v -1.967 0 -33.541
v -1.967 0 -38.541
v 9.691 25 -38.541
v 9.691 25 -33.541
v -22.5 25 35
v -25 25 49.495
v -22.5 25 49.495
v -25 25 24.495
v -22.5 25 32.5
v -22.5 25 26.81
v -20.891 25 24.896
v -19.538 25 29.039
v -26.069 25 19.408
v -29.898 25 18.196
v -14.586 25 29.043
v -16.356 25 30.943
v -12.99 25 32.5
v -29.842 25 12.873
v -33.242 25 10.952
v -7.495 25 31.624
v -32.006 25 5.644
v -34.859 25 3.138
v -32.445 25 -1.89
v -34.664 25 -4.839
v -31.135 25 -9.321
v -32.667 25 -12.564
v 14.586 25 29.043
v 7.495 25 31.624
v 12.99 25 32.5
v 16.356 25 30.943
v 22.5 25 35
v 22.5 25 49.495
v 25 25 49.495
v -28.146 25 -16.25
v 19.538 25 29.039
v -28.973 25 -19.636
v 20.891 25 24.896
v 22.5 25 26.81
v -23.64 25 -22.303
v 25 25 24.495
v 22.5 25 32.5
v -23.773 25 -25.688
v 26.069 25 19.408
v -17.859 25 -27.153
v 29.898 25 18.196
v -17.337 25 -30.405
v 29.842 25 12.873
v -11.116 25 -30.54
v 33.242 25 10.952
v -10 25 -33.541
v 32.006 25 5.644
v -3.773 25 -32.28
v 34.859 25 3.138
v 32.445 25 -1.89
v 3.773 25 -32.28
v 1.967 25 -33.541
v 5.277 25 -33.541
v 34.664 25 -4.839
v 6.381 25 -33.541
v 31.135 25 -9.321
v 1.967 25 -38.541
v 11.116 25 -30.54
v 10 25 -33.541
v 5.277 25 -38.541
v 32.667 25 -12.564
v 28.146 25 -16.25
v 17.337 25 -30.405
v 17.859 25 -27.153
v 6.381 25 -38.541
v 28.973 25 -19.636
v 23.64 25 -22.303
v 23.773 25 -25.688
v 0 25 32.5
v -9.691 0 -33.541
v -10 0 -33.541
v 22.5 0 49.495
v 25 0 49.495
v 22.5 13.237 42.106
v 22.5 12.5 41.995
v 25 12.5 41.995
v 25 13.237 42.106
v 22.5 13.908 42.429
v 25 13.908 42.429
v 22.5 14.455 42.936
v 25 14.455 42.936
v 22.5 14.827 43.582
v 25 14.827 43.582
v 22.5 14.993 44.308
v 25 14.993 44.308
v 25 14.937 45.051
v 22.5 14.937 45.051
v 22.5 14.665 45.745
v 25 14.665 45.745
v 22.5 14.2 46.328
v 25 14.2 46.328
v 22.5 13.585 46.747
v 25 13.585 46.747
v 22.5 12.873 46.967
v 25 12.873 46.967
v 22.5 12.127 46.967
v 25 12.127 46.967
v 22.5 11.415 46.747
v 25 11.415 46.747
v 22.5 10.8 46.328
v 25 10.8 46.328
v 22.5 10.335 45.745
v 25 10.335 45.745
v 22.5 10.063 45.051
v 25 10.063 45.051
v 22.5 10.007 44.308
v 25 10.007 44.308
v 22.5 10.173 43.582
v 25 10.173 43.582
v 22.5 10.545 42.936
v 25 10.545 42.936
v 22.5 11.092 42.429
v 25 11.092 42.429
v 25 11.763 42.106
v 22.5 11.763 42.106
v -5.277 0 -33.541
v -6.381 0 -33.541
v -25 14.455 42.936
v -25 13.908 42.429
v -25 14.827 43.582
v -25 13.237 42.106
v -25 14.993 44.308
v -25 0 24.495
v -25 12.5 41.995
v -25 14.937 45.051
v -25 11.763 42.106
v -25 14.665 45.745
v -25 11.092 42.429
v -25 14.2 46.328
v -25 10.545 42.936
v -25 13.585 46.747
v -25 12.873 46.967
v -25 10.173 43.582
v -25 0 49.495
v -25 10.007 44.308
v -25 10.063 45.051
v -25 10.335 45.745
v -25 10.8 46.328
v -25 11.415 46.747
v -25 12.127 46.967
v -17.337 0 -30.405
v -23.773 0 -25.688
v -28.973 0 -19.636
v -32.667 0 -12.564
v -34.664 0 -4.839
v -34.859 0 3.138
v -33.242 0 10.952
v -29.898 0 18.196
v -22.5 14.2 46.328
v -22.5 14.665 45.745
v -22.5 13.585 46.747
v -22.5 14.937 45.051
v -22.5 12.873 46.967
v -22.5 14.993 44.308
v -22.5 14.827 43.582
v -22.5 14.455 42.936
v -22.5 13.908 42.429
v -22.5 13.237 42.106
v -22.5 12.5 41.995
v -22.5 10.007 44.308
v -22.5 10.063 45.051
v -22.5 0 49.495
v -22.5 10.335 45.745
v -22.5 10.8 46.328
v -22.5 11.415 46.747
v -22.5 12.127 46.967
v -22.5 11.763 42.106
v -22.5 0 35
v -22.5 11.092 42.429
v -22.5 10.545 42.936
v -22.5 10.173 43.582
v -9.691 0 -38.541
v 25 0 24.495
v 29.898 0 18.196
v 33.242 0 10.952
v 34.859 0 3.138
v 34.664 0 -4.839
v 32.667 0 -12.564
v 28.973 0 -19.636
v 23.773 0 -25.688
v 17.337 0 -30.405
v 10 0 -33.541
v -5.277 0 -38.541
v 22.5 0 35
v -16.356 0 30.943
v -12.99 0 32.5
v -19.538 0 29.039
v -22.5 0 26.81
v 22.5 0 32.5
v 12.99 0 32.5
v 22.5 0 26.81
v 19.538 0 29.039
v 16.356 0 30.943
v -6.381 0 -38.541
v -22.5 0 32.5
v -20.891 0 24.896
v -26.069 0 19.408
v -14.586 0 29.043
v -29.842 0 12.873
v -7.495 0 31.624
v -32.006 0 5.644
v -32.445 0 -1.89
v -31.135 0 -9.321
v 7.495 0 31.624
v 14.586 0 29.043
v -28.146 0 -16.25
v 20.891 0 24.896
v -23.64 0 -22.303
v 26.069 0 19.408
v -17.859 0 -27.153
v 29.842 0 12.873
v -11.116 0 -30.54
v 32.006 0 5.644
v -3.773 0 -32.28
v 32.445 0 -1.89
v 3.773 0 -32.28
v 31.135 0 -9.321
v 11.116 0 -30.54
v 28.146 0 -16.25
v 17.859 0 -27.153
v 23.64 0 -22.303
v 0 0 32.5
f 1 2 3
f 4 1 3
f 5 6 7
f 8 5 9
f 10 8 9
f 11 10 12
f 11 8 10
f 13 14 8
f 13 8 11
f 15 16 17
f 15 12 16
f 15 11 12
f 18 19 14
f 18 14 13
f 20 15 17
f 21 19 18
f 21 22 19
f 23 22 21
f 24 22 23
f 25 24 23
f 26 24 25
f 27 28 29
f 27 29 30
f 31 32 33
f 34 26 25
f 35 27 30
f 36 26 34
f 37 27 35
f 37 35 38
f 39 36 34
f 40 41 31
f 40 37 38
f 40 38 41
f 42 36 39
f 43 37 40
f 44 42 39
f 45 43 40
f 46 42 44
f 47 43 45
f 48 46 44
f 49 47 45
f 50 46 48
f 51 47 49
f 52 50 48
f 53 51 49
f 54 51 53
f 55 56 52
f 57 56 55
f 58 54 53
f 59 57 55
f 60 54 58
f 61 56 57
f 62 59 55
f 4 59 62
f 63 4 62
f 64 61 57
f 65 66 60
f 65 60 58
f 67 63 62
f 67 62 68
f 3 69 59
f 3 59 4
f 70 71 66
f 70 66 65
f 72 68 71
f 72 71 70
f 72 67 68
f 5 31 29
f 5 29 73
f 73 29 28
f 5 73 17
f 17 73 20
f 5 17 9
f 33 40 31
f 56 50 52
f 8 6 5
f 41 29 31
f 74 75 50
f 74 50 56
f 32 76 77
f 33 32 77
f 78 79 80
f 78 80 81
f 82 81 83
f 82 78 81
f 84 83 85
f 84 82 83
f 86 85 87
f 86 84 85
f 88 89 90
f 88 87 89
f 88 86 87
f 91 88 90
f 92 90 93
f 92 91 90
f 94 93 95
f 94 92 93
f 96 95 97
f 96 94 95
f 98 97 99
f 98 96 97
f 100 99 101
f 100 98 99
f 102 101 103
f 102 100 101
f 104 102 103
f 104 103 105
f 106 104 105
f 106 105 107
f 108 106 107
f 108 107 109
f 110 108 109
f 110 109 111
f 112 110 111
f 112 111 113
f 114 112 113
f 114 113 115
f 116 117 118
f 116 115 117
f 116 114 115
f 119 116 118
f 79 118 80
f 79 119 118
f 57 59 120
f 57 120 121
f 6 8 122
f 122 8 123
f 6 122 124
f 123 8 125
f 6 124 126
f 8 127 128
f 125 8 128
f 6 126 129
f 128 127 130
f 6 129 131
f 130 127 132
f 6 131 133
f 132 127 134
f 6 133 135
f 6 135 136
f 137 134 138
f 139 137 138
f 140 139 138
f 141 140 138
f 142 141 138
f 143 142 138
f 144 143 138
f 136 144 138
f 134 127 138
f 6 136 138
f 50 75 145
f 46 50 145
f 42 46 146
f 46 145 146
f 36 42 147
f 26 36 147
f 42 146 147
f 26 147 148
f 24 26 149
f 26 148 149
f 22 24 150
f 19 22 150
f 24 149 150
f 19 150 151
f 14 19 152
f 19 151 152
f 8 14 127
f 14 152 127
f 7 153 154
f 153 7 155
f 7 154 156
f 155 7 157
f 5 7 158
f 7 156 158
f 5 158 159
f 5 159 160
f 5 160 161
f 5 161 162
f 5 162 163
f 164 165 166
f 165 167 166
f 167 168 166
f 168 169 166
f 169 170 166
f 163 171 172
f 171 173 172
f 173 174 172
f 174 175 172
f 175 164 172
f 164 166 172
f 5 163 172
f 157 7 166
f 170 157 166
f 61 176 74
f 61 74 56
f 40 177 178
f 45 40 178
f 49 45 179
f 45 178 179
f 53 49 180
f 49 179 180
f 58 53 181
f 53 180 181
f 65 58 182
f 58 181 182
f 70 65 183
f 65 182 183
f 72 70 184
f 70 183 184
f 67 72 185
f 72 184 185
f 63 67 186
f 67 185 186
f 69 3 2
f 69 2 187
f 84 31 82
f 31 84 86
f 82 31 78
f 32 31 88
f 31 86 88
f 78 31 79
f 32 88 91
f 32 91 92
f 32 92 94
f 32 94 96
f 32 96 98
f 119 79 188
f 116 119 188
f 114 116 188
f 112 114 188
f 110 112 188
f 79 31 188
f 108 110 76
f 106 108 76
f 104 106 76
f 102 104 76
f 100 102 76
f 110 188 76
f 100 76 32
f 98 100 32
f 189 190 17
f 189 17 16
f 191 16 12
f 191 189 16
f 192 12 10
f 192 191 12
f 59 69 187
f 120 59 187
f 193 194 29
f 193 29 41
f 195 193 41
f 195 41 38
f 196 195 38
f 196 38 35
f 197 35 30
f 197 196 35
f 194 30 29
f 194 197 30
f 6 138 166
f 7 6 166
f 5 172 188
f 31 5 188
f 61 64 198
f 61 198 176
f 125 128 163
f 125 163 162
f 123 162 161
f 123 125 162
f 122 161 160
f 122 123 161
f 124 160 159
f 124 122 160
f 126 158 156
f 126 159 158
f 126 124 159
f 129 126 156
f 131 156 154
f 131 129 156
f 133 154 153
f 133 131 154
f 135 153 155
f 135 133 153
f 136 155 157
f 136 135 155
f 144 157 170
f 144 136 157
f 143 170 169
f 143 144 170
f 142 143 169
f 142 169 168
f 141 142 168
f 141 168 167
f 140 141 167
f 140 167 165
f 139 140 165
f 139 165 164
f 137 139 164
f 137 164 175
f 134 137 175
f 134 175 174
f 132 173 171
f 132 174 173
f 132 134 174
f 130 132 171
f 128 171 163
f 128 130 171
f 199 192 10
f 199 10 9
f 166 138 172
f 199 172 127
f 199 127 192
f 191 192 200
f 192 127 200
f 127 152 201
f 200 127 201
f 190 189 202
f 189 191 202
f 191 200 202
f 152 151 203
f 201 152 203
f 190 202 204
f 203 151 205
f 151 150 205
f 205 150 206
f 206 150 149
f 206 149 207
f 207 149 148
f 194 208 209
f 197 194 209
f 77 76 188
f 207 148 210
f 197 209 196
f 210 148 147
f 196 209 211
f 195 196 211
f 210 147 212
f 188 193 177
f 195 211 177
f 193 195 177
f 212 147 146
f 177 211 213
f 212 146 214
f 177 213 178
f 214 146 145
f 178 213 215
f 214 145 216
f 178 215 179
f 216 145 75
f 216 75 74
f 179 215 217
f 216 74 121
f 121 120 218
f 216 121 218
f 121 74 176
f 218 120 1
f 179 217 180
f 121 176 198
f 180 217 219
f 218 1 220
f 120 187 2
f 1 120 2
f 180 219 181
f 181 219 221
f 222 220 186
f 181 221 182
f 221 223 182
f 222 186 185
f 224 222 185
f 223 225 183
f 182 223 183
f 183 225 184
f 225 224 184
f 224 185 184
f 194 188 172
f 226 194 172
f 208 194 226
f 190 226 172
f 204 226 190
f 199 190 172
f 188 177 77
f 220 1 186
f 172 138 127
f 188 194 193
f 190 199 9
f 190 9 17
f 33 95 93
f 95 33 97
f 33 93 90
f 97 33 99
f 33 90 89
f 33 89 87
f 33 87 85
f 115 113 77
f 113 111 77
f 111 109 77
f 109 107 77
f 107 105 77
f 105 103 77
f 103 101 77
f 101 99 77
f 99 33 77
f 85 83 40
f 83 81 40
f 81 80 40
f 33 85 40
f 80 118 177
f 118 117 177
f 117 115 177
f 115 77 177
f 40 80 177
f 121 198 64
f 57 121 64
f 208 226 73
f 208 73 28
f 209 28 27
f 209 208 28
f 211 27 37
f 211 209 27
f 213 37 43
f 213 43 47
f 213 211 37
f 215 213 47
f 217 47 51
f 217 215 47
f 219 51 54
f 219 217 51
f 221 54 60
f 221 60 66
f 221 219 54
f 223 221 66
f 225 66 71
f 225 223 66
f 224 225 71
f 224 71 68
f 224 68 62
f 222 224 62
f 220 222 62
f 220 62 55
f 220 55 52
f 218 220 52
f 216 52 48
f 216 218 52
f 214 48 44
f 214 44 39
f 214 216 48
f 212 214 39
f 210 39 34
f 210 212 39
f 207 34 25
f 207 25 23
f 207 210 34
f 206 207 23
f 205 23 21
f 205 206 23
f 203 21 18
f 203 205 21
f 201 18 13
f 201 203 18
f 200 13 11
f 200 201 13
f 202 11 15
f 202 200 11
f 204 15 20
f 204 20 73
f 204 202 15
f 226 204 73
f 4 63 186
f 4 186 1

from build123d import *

# Parameters (mm, degrees)
SKETCH1_R               = 32.5
BOSS_EXTRUDE1_DEPTH     = 25
CUT_EXTRUDE1_DEPTH      = 5
CUT_EXTRUDE2_DEPTH      = 82.699111815
CUT_EXTRUDE2_DEPTH_BACK = 82.699111815
SKETCH3_R               = 2.5


with BuildPart() as part:
    # Sketch1 → Boss-Extrude1 (new body)
    with BuildSketch(Plane(origin=(0, 0, 0), x_dir=(1, 0, 0), z_dir=(0, 1, 0))):
        with BuildLine():
            Line((-22.5, -35), (22.5, -35))
            Line((22.5, -35), (22.5, -49.494897428))
            Line((22.5, -49.494897428), (25, -49.494897428))
            Line((25, -49.494897428), (25, -35))
            Line((25, -35), (25, -24.494897428))
            ThreePointArc((25, -24.494897428), (33.886456264, 8.758315013), (10, 33.541019662))
            Line((10, 33.541019662), (10, 38.541019662))
            Line((10, 38.541019662), (-10, 38.541019662))
            Line((-10, 38.541019662), (-10, 33.541019662))
            ThreePointArc((-10, 33.541019662), (-33.886456264, 8.758315013), (-25, -24.494897428))
            Line((-25, -24.494897428), (-25, -35))
            Line((-25, -35), (-25, -49.494897428))
            Line((-25, -49.494897428), (-22.5, -49.494897428))
            Line((-22.5, -49.494897428), (-22.5, -35))
        make_face()
        Circle(SKETCH1_R, mode=Mode.SUBTRACT)
        with BuildLine():
            Line((-22.5, -26.809513237), (-22.5, -32.5))
            Line((-22.5, -32.5), (-12.990381057, -32.5))
            ThreePointArc((-12.990381057, -32.5), (-17.971844557, -30.033527985), (-22.5, -26.809513237))
        make_face(mode=Mode.SUBTRACT)
        with BuildLine():
            Line((22.5, -32.5), (22.5, -26.809513237))
            ThreePointArc((22.5, -26.809513237), (17.971844557, -30.033527985), (12.990381057, -32.5))
            Line((12.990381057, -32.5), (22.5, -32.5))
        make_face(mode=Mode.SUBTRACT)
    extrude(amount=BOSS_EXTRUDE1_DEPTH)

    # Sketch2 → Cut-Extrude1 (cut)
    with BuildSketch(Plane(origin=(0, 0, -38.541019662), x_dir=(-1, 0, 0), z_dir=(0, 0, -1))):
        Polygon((-6.380534686, 25), (5.277156767, 0), (6.380534686, 0), (-5.277156767, 25), align=None)
        Polygon((-1.967023011, 25), (10, 25), (10, 0), (9.690668443, 0), align=None)
        Polygon((-9.690668443, 25), (-10, 25), (-10, -0.029833576), (1.967023011, 0), align=None)
    extrude(amount=-CUT_EXTRUDE1_DEPTH, mode=Mode.SUBTRACT)

    # Sketch3 → Cut-Extrude2 (cut, two sides: drawn at the far end of the back side and taken through both)
    with BuildSketch(Plane(origin=(25, 0, 0), x_dir=(0, 0, -1), z_dir=(1, 0, 0)).offset(-CUT_EXTRUDE2_DEPTH_BACK)):
        with Locations((-44.494897428, 12.5)):
            Circle(SKETCH3_R)
    extrude(amount=CUT_EXTRUDE2_DEPTH + CUT_EXTRUDE2_DEPTH_BACK, mode=Mode.SUBTRACT)


solid = part.part
